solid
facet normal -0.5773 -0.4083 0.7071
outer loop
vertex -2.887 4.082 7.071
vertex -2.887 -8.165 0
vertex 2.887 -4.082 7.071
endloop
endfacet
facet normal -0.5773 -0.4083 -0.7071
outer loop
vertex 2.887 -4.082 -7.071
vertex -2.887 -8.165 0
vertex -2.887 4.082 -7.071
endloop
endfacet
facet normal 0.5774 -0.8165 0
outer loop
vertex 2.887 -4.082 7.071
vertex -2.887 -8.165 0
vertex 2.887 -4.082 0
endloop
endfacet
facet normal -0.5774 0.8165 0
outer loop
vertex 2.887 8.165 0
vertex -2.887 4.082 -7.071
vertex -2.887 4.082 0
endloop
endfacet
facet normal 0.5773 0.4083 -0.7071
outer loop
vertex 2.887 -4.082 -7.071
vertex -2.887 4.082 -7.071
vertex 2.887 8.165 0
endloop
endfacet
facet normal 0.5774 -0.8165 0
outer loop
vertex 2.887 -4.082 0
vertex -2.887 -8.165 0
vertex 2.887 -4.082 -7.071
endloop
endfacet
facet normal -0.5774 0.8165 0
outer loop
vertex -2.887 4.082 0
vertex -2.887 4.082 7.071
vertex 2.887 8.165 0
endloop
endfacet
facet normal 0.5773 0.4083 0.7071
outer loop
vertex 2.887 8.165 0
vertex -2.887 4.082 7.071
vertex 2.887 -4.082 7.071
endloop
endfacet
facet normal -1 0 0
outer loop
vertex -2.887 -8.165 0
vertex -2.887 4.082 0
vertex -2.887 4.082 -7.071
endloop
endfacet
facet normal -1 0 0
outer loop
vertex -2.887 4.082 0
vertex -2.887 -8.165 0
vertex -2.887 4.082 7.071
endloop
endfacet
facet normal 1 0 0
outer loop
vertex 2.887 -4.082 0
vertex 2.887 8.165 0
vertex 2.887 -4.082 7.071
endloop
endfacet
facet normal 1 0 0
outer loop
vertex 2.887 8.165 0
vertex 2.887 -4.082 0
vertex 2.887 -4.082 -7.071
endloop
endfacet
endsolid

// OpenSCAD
// OpenSCAD 为免费开源的跨平台建模软件
// 作者：上海市第三女子初级中学 谢丁

a = 10; // 立方体的边长
e = 0.0; // 咬合面距离调整，数值越小，咬合精度越高
length = norm([a, a, a]); // 欧氏距离
b = acos(a / length); // 倾斜角
c = atan2(a, a);    // 方位角

difference() // 相减布尔运算
{
  rotate([0, -c, 90 - b]) cube([a, a, a], center = true); // 原始立方体
  translate([-length / 3, 0, 0]) cube([sqrt(3)*a / 3, sqrt(3)*a, sqrt(3)*a], center = true); // 左侧的立方体结构
  translate([length / 3, 0, 0]) cube([sqrt(3)*a / 3, sqrt(3)*a, sqrt(3)*a], center = true); // 右侧的立方体结构
}
